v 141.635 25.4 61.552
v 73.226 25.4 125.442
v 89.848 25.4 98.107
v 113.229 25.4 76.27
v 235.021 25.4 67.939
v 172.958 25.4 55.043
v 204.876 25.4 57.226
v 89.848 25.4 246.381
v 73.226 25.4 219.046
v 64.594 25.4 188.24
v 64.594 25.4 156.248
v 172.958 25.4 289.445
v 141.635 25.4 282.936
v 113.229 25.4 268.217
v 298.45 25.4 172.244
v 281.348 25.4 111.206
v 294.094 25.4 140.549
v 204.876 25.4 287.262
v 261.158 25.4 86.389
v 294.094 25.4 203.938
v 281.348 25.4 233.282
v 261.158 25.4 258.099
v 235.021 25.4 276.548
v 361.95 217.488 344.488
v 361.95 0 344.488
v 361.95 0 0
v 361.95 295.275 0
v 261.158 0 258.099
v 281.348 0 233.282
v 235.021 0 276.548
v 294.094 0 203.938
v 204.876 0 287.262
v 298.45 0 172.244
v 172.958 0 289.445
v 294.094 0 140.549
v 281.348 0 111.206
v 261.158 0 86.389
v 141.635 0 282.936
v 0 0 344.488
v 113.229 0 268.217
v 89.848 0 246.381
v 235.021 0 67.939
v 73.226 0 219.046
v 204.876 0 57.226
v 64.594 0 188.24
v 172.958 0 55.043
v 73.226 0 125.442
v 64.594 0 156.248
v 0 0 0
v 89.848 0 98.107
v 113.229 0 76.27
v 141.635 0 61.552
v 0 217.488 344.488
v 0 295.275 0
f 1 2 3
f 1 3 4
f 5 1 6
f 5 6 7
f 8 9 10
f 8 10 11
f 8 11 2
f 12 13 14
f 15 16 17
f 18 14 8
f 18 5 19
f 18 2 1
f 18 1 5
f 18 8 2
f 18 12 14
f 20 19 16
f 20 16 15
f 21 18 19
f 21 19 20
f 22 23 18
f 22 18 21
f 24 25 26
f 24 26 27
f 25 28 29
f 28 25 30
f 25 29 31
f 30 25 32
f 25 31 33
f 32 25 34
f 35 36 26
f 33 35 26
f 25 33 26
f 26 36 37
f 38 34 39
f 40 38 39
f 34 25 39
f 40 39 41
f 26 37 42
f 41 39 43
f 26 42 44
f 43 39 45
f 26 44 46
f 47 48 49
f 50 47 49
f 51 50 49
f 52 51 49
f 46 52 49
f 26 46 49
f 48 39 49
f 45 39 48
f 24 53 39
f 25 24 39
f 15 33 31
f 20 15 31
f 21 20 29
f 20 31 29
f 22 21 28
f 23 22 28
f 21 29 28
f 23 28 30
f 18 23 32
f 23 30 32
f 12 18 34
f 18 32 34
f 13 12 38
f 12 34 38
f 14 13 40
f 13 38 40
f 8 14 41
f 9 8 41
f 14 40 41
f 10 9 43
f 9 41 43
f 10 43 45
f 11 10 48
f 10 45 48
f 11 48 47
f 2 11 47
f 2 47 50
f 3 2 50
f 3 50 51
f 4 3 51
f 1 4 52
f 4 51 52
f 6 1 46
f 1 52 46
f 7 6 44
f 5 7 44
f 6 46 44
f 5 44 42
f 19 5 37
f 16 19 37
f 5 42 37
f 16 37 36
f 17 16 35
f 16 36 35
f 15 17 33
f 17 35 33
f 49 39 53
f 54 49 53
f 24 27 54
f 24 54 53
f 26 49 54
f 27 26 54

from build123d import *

# Parameters (mm, degrees)
F1_DEPTH = 361.95
F2_R     = 117.475
F3_DEPTH = 25.4


with BuildPart() as f1:
    # F0 (on Right) → F1 (new body)
    with BuildSketch(Plane.YZ):
        Polygon((0, 344.4875), (0, 0), (295.275, 0), (217.4875, 344.4875), align=None)
    extrude(amount=F1_DEPTH)

    # F2 (on face) → F3 (cut)
    with BuildSketch(Plane.XZ):
        with Locations((180.975, 172.24375)):
            Circle(F2_R)
    extrude(amount=-F3_DEPTH, mode=Mode.SUBTRACT)


solid = f1.part
